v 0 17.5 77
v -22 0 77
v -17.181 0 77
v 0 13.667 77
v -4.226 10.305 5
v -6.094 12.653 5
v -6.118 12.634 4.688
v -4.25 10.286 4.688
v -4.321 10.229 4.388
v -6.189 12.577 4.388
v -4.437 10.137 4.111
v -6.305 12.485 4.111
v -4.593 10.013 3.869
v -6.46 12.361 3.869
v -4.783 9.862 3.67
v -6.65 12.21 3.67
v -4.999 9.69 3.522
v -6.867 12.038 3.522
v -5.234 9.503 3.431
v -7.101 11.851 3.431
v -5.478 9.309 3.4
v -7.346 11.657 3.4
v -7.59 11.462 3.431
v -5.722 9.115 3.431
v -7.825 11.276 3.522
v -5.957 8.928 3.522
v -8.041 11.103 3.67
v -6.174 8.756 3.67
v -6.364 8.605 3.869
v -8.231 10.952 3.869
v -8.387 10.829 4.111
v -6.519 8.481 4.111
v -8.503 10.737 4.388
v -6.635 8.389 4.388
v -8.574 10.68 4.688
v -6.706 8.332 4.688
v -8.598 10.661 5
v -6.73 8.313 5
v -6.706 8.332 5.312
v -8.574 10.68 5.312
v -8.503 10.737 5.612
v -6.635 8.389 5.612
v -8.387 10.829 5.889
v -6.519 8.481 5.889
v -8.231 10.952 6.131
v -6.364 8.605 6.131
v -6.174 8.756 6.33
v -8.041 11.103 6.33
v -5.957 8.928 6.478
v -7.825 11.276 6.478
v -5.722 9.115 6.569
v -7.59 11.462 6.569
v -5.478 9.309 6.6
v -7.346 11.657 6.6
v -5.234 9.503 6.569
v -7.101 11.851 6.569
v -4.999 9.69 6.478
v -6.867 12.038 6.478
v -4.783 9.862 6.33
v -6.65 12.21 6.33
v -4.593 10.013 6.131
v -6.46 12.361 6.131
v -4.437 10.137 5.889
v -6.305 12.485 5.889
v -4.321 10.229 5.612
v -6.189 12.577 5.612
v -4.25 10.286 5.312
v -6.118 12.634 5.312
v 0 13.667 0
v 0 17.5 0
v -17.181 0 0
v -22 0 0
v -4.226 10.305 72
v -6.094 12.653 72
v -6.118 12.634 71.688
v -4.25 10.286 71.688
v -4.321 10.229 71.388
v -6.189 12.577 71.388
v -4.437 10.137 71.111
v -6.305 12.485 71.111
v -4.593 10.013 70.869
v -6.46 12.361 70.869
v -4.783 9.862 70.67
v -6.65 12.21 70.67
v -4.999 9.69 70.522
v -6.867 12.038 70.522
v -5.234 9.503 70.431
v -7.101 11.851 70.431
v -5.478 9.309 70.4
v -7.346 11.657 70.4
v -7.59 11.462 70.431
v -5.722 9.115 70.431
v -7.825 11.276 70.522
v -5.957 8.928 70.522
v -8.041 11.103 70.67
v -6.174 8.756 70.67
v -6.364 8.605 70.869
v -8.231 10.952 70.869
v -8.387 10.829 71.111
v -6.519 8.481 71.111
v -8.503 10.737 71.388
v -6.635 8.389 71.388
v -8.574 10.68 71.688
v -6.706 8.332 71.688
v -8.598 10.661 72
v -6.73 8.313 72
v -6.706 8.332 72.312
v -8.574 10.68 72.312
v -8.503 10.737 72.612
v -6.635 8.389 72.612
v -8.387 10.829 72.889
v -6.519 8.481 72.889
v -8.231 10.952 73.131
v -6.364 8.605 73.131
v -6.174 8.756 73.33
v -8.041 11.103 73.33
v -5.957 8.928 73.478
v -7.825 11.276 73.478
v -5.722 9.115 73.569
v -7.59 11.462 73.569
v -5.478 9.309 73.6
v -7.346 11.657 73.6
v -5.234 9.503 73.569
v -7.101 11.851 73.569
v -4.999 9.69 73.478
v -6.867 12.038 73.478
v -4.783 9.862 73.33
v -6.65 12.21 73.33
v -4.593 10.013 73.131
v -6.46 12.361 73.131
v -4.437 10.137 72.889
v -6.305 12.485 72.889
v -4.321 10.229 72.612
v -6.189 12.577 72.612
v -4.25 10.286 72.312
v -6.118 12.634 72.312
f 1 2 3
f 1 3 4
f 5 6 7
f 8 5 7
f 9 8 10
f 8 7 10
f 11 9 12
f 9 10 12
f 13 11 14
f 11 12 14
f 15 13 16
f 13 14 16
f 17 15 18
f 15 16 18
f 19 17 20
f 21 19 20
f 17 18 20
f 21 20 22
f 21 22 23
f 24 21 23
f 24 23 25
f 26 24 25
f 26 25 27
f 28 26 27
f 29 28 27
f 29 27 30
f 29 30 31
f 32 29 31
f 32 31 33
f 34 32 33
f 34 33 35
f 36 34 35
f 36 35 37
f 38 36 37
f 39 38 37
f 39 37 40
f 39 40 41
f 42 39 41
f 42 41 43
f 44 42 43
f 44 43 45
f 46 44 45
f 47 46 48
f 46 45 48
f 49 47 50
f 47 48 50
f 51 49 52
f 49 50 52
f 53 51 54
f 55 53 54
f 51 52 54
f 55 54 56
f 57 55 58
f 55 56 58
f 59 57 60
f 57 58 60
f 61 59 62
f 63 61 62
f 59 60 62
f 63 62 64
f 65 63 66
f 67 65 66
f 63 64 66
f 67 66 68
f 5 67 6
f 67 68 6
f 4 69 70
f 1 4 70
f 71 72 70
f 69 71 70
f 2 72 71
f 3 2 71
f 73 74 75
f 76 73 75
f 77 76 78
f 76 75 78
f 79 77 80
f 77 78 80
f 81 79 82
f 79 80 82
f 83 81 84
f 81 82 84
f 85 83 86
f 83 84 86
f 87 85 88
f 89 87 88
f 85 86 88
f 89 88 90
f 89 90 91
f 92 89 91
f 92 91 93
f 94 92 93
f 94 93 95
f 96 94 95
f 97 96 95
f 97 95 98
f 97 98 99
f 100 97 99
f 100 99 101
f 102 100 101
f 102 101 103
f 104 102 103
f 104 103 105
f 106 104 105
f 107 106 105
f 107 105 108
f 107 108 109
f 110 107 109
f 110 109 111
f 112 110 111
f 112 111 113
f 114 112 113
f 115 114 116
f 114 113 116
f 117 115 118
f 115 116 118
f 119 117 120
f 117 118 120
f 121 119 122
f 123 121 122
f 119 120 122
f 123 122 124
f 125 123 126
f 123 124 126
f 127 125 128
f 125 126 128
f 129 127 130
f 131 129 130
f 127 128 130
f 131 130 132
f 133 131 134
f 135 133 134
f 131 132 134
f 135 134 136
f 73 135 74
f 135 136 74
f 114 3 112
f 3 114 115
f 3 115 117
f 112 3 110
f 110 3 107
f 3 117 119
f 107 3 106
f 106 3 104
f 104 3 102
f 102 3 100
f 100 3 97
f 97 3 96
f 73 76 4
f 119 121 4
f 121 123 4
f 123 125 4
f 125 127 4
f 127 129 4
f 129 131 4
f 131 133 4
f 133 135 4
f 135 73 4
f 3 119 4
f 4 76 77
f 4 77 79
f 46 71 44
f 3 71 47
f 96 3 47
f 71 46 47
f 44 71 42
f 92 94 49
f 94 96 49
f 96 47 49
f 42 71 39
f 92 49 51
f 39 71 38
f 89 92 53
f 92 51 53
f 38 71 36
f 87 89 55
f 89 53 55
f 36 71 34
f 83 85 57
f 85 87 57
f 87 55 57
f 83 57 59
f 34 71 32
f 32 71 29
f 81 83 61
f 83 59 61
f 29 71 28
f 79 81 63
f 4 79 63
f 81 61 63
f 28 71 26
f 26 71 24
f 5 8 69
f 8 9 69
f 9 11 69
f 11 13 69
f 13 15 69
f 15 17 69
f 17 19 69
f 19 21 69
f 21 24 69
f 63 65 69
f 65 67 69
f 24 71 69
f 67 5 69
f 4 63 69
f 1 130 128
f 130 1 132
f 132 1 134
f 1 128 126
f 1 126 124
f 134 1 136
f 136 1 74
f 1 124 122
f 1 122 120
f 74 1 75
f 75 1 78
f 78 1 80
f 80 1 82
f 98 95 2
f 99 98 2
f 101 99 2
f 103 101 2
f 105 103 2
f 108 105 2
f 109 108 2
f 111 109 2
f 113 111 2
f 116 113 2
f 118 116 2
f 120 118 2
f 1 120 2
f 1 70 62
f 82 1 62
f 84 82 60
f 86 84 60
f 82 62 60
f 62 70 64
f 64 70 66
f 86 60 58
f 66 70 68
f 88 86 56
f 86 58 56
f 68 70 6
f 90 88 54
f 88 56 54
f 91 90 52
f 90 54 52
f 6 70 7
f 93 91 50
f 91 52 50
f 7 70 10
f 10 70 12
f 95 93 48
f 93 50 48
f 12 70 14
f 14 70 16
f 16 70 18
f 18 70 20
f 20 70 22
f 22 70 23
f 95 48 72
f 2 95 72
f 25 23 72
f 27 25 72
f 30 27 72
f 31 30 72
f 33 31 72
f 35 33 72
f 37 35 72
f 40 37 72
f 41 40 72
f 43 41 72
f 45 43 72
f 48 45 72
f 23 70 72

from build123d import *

# Parameters (mm, degrees)
SALIENTE_EXTRUIR1_DEPTH = 77
CORTAR_EXTRUIR1_REACH   = 15.696
CROQUIS2_R              = 1.6


with BuildPart() as part:
    # Croquis1 → Saliente-Extruir1 (new body)
    with BuildSketch(Plane.XY):
        Polygon((-22, 0), (-17.180905327, 0), (0, 13.666629237), (0, 17.5), align=None)
    extrude(amount=SALIENTE_EXTRUIR1_DEPTH)

    # Croquis2 → Cortar-Extruir1 (cut, up to next)
    with BuildSketch(Plane(origin=(-8.52578298, 10.718127175, 0), x_dir=(0.782601054, 0.622523566, 0), z_dir=(-0.622523566, 0.782601054, 0)), mode=Mode.PRIVATE) as cortar_extruir1_sk1:
        with Locations((1.507798766, -5)):
            Circle(CROQUIS2_R)
    cortar_extruir1_tool1 = extrude(cortar_extruir1_sk1.sketch, amount=-CORTAR_EXTRUIR1_REACH, mode=Mode.PRIVATE) & part.part
    add(cortar_extruir1_tool1.solids().sort_by_distance((-7.345778, 11.656767, 5))[0], mode=Mode.SUBTRACT)
    # Croquis2 → Cortar-Extruir1 (cut, up to next)
    with BuildSketch(Plane(origin=(-8.52578298, 10.718127175, 0), x_dir=(0.782601054, 0.622523566, 0), z_dir=(-0.622523566, 0.782601054, 0)), mode=Mode.PRIVATE) as cortar_extruir1_sk2:
        with Locations((1.507798766, -72)):
            Circle(CROQUIS2_R)
    cortar_extruir1_tool2 = extrude(cortar_extruir1_sk2.sketch, amount=-CORTAR_EXTRUIR1_REACH, mode=Mode.PRIVATE) & part.part
    add(cortar_extruir1_tool2.solids().sort_by_distance((-7.345778, 11.656767, 72))[0], mode=Mode.SUBTRACT)


solid = part.part
